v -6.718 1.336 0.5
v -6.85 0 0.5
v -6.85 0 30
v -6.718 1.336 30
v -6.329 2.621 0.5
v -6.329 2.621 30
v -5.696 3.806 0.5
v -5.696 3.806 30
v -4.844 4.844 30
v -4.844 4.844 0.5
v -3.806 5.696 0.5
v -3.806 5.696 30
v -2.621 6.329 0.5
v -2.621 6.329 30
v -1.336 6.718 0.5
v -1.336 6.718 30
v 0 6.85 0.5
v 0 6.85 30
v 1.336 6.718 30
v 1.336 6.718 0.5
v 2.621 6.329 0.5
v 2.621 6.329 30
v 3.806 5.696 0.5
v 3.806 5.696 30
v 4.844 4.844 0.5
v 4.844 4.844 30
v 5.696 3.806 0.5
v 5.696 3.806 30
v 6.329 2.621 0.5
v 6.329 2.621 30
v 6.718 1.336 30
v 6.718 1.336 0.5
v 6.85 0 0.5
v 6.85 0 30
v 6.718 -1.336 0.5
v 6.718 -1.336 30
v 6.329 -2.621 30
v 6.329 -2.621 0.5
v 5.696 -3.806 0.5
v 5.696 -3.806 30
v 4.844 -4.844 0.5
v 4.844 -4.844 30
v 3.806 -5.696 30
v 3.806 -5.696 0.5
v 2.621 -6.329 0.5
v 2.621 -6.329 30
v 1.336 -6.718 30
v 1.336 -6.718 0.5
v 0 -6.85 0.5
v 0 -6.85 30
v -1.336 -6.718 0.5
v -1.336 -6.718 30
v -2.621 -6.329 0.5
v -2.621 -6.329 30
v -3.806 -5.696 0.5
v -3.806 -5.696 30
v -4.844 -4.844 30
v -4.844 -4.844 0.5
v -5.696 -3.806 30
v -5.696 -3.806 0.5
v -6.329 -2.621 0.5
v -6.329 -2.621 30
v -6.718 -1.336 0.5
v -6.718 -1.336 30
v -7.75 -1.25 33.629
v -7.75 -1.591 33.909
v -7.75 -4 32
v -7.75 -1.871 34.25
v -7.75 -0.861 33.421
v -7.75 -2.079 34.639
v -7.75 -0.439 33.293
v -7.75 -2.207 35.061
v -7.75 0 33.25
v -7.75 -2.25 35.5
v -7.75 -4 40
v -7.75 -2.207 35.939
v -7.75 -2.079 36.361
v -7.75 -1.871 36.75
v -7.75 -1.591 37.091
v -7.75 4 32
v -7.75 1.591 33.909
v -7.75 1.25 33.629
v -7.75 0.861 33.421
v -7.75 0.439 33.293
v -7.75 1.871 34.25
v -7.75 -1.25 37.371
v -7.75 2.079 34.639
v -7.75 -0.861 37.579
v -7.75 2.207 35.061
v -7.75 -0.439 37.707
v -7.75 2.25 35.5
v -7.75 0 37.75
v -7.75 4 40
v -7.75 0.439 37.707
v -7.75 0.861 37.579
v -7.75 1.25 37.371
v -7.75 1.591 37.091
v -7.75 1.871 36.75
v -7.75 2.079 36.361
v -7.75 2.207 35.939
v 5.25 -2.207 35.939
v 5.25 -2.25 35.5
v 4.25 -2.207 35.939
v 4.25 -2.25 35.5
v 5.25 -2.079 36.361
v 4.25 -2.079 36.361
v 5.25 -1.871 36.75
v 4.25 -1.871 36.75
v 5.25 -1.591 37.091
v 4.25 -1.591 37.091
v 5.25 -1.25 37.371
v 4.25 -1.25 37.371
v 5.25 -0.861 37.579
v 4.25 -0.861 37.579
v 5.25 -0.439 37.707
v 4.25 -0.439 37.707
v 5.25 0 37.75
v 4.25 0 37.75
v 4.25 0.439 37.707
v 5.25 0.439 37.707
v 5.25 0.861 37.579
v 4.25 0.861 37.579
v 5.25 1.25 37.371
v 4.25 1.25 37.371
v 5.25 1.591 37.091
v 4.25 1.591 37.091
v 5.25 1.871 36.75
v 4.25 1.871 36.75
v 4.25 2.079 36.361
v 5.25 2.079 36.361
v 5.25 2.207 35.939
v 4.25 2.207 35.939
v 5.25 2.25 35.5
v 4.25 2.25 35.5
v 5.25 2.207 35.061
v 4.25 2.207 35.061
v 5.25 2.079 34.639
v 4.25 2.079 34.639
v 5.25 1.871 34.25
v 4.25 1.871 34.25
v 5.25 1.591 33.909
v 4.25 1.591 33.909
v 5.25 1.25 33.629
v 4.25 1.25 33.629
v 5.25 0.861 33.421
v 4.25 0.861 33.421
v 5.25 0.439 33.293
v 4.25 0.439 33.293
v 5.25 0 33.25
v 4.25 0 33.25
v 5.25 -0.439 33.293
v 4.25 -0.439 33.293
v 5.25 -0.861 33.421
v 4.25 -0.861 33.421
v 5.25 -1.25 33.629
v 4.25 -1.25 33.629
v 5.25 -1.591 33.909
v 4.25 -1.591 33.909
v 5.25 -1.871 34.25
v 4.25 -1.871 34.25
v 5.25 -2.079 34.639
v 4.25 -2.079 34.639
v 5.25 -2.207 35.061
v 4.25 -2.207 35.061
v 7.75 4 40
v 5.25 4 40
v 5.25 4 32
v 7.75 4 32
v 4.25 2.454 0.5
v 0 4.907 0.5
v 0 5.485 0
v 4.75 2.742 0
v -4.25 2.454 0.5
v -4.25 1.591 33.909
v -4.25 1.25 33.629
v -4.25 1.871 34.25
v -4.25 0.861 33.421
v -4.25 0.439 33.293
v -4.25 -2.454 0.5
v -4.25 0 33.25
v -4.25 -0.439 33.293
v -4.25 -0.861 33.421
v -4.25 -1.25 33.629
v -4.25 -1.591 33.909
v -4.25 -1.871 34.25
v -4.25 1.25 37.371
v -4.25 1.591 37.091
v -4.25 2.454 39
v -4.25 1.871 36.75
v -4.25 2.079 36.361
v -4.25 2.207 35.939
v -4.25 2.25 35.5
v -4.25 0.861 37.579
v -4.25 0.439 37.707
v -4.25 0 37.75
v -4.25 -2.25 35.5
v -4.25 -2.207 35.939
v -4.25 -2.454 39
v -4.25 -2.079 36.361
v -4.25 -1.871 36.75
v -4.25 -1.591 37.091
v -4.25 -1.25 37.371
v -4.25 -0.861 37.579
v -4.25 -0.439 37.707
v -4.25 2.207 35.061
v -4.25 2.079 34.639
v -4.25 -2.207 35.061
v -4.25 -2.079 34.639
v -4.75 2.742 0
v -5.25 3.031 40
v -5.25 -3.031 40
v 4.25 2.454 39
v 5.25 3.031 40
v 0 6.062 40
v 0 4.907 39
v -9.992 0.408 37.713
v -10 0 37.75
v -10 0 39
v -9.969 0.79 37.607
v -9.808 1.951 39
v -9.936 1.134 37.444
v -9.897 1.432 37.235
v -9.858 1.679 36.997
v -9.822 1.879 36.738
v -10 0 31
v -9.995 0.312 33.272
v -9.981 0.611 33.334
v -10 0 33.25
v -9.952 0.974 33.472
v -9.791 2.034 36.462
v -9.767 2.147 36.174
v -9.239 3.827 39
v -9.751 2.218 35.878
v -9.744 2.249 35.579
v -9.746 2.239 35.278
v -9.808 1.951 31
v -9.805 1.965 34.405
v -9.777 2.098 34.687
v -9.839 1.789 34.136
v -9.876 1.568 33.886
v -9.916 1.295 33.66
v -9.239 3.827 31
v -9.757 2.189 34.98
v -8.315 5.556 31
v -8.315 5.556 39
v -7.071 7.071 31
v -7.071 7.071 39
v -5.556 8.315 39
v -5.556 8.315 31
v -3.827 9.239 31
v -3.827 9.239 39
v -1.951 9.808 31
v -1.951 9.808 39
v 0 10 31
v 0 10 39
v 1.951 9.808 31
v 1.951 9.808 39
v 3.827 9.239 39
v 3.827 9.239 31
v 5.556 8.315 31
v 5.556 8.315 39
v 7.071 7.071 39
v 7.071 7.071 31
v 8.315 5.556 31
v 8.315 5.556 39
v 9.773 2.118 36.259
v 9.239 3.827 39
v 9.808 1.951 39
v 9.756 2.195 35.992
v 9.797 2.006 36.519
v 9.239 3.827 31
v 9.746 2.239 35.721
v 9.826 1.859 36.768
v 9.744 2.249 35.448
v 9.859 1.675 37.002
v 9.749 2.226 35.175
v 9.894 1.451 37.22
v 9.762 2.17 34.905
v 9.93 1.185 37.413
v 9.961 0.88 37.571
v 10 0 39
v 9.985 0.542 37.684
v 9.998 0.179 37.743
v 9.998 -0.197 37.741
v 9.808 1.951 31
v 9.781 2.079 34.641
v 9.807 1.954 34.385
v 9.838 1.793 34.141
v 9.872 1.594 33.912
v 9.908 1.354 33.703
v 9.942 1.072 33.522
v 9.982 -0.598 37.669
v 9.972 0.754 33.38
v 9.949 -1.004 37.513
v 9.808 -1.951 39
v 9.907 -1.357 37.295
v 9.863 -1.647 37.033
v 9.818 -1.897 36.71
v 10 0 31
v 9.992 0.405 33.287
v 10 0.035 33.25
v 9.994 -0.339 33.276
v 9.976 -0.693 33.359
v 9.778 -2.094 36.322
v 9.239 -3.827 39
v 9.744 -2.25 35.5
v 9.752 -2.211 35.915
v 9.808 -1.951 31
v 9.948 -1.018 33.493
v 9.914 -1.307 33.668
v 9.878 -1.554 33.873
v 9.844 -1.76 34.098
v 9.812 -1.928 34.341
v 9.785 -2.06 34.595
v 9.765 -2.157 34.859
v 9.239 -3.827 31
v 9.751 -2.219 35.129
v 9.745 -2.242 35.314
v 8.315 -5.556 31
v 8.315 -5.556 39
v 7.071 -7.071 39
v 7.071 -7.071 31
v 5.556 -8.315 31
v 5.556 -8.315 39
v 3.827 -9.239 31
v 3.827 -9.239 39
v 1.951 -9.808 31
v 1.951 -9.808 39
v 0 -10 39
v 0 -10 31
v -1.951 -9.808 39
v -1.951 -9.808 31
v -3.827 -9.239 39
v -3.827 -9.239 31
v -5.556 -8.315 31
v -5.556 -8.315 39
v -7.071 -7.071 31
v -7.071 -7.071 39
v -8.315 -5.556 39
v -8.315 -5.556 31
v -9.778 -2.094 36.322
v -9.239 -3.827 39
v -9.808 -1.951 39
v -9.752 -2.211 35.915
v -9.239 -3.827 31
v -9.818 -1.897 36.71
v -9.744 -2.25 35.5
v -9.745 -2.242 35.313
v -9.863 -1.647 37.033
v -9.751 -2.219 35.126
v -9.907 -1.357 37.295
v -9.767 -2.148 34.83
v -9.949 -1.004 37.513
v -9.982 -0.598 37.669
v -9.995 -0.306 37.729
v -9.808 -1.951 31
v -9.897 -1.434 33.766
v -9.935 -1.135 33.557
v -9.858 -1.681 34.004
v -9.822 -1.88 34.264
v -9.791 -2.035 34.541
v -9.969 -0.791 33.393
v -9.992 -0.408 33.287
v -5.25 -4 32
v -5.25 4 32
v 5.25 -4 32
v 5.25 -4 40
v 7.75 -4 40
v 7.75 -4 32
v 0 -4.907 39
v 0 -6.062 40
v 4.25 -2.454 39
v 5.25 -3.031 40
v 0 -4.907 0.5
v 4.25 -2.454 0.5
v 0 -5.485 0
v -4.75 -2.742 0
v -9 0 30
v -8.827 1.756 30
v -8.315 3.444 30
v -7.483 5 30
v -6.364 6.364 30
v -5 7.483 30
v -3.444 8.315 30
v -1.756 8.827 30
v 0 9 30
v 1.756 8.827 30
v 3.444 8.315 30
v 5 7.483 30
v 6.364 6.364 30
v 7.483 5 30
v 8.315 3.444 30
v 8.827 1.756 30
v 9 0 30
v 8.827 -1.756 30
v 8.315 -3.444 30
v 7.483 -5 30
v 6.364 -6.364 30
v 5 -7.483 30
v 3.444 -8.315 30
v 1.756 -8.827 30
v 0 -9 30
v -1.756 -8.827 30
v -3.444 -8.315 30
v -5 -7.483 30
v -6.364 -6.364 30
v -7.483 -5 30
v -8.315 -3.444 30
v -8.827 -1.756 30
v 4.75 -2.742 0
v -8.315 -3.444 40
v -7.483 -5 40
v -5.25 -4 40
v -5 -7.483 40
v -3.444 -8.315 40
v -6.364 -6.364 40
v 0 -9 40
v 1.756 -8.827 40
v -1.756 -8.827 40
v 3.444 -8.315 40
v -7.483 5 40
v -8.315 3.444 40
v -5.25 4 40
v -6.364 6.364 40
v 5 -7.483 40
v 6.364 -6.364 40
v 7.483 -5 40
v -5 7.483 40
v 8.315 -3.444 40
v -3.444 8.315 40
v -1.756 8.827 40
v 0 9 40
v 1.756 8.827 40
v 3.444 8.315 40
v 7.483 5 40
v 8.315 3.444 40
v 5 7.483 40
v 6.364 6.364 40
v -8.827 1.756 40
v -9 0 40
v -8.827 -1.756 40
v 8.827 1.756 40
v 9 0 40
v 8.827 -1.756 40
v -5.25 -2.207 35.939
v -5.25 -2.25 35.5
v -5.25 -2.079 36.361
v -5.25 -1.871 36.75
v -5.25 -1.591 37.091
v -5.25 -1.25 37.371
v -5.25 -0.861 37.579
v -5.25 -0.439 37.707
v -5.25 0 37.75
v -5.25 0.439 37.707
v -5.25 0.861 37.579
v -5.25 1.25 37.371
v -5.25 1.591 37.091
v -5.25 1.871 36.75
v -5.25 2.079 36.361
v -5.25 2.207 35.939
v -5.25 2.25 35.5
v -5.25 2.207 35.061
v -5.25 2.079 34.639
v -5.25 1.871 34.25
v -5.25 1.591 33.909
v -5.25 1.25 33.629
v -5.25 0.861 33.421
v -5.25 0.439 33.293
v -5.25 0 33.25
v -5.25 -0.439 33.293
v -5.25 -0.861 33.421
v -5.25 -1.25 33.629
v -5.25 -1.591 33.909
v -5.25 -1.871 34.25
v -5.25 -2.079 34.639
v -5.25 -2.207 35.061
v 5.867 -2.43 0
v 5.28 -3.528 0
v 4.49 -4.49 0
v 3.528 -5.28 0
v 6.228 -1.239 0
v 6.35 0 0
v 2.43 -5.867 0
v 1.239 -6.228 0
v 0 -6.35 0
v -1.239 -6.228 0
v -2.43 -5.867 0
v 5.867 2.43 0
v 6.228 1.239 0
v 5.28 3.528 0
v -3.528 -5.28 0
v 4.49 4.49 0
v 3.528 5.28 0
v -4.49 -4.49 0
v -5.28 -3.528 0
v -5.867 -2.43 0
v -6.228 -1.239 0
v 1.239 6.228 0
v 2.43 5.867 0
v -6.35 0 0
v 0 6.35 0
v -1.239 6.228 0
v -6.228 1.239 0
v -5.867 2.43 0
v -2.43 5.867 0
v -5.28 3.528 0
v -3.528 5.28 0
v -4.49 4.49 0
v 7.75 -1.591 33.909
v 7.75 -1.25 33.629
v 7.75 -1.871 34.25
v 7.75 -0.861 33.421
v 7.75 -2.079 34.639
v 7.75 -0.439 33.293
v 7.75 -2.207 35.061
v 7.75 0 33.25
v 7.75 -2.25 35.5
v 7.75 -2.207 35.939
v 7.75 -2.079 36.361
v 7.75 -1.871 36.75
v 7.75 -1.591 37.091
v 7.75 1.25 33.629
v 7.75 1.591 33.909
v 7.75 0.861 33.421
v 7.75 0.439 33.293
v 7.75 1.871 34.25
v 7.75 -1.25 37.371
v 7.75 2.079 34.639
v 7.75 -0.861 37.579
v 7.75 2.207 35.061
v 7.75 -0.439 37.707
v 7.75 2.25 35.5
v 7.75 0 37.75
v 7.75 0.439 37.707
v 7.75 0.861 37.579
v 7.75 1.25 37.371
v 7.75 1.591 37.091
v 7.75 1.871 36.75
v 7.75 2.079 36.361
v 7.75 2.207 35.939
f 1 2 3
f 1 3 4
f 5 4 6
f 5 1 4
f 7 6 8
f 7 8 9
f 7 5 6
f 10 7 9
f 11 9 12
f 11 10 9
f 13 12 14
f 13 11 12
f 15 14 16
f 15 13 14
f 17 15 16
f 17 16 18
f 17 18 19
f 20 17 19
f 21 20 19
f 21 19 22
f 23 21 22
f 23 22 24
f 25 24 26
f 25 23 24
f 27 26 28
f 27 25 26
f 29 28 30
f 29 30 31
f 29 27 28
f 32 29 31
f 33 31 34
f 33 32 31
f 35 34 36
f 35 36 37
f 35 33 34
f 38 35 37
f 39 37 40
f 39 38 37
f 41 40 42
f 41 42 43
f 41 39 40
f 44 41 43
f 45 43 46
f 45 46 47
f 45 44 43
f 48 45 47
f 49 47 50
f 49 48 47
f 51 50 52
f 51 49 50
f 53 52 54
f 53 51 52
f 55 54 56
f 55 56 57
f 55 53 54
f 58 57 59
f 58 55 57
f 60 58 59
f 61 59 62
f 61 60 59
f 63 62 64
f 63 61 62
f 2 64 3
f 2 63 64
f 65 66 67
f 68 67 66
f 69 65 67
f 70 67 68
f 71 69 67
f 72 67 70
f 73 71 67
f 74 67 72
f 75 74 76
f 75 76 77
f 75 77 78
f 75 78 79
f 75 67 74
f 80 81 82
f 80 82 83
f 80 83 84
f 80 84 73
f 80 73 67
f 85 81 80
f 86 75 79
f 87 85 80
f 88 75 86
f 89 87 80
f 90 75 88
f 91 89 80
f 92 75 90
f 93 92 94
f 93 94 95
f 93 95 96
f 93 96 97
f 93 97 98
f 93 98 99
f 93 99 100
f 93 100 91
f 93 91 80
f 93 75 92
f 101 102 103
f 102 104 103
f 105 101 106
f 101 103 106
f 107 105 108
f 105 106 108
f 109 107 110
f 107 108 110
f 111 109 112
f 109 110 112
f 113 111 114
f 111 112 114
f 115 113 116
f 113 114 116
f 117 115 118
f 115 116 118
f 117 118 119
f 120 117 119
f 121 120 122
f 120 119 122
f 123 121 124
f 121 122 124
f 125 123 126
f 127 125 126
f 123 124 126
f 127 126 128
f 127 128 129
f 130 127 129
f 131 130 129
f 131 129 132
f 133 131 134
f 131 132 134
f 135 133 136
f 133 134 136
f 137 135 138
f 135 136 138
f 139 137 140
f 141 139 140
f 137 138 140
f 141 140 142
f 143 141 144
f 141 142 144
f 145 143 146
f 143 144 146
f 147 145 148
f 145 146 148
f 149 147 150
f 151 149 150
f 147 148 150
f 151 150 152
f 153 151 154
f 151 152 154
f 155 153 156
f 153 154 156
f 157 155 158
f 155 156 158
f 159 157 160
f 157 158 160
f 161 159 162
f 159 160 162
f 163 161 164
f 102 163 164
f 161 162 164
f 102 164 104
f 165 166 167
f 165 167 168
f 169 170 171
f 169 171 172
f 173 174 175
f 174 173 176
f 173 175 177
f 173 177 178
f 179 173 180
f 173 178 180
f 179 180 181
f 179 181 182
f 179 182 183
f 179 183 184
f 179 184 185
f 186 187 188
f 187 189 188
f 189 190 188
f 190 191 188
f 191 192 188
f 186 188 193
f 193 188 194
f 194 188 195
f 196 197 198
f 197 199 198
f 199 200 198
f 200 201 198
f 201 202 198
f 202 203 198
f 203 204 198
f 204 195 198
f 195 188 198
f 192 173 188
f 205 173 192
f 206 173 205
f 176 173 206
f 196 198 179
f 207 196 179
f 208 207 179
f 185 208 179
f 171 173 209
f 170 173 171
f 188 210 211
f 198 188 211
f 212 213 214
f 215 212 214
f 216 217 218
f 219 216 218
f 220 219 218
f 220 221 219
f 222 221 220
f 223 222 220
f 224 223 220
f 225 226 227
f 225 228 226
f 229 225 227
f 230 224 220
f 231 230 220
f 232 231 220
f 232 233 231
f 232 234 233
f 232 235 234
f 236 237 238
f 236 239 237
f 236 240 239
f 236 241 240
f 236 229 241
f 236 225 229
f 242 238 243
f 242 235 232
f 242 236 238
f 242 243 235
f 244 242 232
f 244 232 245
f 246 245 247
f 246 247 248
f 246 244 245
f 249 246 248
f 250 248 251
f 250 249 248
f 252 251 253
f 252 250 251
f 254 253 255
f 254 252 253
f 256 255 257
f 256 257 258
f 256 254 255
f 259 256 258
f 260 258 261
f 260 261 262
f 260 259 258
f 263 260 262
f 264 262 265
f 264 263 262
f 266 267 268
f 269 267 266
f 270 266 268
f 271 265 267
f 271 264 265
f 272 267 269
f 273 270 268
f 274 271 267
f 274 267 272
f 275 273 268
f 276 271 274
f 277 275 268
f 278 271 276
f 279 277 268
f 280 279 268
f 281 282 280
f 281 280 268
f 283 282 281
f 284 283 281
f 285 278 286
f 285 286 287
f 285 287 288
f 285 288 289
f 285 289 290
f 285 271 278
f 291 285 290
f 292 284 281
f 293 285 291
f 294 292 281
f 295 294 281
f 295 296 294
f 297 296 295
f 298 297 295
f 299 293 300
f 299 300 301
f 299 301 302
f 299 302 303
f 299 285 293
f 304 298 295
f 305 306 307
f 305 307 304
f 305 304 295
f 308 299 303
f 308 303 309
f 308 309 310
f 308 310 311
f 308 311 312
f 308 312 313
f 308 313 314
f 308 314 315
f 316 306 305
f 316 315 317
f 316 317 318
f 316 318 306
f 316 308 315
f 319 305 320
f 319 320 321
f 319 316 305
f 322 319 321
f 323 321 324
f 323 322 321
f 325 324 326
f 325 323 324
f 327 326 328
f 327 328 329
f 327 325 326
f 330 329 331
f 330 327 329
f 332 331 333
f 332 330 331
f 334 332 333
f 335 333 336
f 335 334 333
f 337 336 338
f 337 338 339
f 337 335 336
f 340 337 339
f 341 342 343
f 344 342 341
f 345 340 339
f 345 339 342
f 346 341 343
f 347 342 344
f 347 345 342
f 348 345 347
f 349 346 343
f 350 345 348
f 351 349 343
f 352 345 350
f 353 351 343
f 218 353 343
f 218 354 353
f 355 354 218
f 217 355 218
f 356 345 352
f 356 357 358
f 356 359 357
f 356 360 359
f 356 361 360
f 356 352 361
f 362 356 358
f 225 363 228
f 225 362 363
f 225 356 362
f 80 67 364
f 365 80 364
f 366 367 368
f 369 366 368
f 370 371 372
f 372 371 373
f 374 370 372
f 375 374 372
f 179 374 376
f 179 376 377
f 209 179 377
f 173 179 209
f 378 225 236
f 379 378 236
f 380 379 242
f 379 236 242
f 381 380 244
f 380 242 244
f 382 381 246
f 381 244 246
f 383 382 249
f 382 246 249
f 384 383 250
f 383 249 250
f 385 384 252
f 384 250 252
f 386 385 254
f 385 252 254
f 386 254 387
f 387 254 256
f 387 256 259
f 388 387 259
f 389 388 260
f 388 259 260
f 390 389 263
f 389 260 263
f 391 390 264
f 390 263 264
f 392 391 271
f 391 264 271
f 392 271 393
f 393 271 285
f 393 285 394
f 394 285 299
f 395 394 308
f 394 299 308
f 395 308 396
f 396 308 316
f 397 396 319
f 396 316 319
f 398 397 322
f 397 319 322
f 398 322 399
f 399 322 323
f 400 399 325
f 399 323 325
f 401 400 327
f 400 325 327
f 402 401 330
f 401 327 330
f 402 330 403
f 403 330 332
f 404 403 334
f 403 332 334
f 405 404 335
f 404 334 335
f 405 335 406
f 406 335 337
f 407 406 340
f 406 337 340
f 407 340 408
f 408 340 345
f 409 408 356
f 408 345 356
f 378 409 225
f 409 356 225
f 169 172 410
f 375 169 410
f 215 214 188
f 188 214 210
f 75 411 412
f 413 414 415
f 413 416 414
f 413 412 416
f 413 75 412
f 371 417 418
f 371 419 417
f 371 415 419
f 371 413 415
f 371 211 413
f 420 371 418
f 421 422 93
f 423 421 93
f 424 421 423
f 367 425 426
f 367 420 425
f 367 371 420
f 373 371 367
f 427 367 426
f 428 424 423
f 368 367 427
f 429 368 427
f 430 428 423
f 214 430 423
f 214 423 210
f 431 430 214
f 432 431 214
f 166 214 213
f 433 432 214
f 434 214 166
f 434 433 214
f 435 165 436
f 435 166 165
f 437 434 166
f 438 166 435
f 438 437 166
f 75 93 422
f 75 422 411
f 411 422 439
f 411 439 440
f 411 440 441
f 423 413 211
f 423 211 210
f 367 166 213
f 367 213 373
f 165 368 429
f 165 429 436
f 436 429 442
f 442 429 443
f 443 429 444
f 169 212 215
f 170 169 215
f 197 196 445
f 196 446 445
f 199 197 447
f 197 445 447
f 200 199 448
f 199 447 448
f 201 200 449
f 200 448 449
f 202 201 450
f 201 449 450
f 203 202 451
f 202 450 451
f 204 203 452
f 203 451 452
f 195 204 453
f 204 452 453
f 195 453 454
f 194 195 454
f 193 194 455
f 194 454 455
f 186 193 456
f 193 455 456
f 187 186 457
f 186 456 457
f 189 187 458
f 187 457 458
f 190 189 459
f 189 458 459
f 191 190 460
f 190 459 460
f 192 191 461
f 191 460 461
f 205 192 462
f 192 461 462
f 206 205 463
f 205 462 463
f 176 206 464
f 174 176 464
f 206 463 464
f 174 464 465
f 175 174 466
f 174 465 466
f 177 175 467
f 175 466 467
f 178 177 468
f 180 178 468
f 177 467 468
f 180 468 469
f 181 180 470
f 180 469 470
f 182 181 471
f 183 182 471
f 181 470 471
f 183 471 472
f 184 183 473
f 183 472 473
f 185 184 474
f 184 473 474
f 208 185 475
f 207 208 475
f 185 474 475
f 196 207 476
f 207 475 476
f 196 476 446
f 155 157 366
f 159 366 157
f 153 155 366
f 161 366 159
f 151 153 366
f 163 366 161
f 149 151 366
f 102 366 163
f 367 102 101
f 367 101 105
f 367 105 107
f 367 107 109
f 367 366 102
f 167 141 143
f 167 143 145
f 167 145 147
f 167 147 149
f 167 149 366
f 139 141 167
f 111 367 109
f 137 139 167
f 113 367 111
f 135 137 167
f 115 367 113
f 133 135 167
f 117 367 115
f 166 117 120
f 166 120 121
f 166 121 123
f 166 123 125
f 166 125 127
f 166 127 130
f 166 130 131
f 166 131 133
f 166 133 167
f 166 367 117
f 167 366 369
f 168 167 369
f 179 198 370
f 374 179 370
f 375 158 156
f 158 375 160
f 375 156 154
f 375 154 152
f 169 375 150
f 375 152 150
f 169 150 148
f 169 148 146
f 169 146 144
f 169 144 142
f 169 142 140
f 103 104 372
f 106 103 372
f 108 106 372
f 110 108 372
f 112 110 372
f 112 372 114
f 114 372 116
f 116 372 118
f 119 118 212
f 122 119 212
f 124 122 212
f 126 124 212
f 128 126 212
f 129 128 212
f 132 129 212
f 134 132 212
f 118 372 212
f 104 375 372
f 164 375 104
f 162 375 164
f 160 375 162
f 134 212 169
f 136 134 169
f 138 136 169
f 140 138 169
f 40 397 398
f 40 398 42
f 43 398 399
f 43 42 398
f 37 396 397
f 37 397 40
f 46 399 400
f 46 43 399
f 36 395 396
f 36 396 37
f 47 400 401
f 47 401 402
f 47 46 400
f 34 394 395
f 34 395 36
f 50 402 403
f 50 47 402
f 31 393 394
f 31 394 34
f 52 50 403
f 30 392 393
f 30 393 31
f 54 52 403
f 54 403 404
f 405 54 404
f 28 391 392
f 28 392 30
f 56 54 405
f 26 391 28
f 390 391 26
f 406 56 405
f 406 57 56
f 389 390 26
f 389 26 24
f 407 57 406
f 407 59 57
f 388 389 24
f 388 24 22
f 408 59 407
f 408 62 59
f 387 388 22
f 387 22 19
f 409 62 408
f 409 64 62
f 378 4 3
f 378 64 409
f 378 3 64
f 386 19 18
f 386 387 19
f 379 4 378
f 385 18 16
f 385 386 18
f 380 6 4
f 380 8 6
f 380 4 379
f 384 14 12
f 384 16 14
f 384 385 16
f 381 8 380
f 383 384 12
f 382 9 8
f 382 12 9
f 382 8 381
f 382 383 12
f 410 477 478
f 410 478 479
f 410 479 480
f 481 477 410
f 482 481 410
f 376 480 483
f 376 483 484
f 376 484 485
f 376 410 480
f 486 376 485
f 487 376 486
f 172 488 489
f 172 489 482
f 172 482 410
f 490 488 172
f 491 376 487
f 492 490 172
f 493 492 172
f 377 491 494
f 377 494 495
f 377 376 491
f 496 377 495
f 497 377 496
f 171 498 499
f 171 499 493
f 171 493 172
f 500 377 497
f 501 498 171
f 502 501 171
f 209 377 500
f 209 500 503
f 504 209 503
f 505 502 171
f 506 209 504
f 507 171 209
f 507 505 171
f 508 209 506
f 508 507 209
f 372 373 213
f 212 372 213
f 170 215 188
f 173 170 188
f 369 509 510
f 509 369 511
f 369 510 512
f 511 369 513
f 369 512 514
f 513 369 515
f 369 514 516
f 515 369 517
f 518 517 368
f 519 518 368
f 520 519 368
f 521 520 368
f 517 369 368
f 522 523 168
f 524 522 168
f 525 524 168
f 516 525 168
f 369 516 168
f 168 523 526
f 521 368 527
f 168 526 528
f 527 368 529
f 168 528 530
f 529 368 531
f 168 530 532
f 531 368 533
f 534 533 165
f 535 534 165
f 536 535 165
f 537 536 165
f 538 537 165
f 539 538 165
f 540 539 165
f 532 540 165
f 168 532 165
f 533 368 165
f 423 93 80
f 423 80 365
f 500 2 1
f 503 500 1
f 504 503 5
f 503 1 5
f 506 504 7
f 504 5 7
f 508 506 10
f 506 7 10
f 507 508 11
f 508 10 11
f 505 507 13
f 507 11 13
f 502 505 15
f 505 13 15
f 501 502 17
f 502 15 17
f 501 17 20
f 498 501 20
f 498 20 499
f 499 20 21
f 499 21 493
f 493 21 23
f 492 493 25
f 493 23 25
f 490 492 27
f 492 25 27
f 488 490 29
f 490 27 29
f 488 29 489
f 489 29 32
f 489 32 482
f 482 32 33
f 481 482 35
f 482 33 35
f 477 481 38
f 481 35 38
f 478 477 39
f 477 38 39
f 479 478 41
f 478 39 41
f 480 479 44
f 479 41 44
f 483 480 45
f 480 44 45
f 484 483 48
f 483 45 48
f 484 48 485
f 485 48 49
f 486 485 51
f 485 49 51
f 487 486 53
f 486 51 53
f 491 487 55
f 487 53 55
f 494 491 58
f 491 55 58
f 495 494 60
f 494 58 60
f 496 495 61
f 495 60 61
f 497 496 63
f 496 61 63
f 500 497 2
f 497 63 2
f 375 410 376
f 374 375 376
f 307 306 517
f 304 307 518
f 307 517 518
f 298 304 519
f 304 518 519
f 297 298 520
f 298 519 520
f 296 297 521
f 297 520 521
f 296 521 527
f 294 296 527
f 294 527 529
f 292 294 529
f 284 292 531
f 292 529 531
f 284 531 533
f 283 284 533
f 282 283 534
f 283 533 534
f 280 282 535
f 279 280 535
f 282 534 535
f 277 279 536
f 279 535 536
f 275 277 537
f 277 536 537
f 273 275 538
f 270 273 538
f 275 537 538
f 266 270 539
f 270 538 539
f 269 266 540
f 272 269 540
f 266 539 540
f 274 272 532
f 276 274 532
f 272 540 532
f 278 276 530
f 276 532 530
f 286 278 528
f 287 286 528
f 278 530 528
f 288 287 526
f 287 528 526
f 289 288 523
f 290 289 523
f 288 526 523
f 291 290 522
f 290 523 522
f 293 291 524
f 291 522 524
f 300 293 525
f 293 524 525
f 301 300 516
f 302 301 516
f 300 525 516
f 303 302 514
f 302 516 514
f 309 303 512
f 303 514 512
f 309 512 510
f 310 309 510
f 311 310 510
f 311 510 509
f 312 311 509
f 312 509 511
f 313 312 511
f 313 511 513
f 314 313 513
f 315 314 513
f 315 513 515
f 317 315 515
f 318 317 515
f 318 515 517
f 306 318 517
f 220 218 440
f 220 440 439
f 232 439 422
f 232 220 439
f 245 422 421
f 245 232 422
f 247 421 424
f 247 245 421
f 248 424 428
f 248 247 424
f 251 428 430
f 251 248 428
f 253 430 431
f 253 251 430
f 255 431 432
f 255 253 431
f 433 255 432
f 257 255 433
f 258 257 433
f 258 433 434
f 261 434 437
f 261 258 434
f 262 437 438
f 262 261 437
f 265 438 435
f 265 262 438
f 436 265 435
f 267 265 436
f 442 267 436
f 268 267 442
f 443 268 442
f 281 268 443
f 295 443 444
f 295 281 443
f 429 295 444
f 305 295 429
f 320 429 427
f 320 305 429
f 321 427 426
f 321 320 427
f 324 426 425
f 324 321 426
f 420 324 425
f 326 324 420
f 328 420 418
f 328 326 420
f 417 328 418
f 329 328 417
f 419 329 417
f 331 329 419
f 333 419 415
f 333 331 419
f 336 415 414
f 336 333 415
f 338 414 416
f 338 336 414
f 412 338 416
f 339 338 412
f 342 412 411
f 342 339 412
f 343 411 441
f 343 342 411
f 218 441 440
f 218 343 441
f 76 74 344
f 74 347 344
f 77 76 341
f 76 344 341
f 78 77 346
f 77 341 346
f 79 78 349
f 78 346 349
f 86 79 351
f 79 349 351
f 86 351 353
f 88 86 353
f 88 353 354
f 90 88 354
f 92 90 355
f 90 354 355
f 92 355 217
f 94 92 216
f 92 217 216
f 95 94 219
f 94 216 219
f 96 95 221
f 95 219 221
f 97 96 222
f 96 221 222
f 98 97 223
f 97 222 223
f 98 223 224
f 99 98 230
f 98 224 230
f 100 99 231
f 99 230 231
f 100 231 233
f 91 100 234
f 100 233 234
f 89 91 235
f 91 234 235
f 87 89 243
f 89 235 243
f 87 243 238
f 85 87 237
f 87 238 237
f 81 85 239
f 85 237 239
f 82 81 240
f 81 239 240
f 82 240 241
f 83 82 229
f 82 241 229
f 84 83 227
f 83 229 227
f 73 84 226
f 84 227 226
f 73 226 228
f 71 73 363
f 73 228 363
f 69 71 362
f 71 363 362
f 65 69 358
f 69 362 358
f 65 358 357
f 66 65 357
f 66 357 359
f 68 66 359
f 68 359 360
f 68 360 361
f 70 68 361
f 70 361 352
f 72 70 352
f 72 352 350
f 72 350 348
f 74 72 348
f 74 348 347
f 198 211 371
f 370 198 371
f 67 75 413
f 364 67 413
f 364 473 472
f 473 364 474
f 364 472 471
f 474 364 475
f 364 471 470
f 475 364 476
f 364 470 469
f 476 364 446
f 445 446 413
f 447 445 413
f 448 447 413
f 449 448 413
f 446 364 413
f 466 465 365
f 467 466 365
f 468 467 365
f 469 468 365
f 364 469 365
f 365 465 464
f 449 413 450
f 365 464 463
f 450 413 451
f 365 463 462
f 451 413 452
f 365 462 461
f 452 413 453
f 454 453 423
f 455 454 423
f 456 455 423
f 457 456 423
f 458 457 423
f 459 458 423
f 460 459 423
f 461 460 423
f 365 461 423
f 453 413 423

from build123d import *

# Parameters (mm, degrees)
F3_DEPTH = 40.001
F2_W     = 2.5
F2_H     = 8
F4_DEPTH = 8
F5_R     = 2.25
F6_DEPTH = 25
F7_SIZE  = 0.99999
F8_SIZE  = 0.5


# Not quite as in the source:
# - a fillet or chamfer is up to 0.001 mm smaller than in the source, because OpenCascade refuses the exact size


with BuildPart() as f1:
    # F0 (on Front) → F1 (revolve)
    with BuildSketch(Plane.XZ):
        Polygon((-6.85, 0), (0, 0), (0, 40), (-10, 40), (-10, 30), (-6.85, 30), align=None)
    revolve(axis=Axis((0, 0, 20), (0, 0, -1)))

    # F2 (on face) → F3 (cut, through all)
    with BuildSketch(Plane.XY.offset(40)):
        Polygon((4.25, -2.4537386441), (4.25, 2.4537386441), (0, 4.9074772881), (-4.25, 2.4537386441), (-4.25, -2.4537386441), (0, -4.9074772881), align=None)
    extrude(amount=-F3_DEPTH, mode=Mode.SUBTRACT)

    # F2 (on face) → F4 (cut)
    with BuildSketch(Plane.XY.offset(40)):
        with Locations((-6.5, 0)):
            Rectangle(F2_W, F2_H)
        with Locations((6.5, 0)):
            Rectangle(F2_W, F2_H)
    extrude(amount=-F4_DEPTH, mode=Mode.SUBTRACT)

    # F5 (on face) → F6 (cut, symmetric)
    with BuildSketch(Plane(origin=(-5.25, 0, 0), x_dir=(0, -1, 0), z_dir=(-1, 0, 0))):
        with Locations((0, 35.5)):
            Circle(F5_R)
    extrude(amount=F6_DEPTH, both=True, mode=Mode.SUBTRACT)

    # F7 (size 1 in the source; OpenCascade refuses exactly that, so slightly less here)
    f7_edges = [f1.edges().sort_by_distance(p)[0] for p in [
        (10, 0, 40),
        (10, 0, 30),
        (-2.125, 3.680608, 40),
        (2.125, 3.680608, 40),
        (4.25, 0, 40),
        (2.125, -3.680608, 40),
        (-2.125, -3.680608, 40),
        (-4.25, 0, 40),
    ]]
    chamfer(f7_edges, length=F7_SIZE)

    # F8
    f8_edges = [f1.edges().sort_by_distance(p)[0] for p in [
        (6.85, 0, 0),
        (4.25, 0, 0),
        (2.125, -3.680608, 0),
        (-2.125, -3.680608, 0),
        (-4.25, 0, 0),
        (-2.125, 3.680608, 0),
        (2.125, 3.680608, 0),
    ]]
    chamfer(f8_edges, length=F8_SIZE)


solid = f1.part
